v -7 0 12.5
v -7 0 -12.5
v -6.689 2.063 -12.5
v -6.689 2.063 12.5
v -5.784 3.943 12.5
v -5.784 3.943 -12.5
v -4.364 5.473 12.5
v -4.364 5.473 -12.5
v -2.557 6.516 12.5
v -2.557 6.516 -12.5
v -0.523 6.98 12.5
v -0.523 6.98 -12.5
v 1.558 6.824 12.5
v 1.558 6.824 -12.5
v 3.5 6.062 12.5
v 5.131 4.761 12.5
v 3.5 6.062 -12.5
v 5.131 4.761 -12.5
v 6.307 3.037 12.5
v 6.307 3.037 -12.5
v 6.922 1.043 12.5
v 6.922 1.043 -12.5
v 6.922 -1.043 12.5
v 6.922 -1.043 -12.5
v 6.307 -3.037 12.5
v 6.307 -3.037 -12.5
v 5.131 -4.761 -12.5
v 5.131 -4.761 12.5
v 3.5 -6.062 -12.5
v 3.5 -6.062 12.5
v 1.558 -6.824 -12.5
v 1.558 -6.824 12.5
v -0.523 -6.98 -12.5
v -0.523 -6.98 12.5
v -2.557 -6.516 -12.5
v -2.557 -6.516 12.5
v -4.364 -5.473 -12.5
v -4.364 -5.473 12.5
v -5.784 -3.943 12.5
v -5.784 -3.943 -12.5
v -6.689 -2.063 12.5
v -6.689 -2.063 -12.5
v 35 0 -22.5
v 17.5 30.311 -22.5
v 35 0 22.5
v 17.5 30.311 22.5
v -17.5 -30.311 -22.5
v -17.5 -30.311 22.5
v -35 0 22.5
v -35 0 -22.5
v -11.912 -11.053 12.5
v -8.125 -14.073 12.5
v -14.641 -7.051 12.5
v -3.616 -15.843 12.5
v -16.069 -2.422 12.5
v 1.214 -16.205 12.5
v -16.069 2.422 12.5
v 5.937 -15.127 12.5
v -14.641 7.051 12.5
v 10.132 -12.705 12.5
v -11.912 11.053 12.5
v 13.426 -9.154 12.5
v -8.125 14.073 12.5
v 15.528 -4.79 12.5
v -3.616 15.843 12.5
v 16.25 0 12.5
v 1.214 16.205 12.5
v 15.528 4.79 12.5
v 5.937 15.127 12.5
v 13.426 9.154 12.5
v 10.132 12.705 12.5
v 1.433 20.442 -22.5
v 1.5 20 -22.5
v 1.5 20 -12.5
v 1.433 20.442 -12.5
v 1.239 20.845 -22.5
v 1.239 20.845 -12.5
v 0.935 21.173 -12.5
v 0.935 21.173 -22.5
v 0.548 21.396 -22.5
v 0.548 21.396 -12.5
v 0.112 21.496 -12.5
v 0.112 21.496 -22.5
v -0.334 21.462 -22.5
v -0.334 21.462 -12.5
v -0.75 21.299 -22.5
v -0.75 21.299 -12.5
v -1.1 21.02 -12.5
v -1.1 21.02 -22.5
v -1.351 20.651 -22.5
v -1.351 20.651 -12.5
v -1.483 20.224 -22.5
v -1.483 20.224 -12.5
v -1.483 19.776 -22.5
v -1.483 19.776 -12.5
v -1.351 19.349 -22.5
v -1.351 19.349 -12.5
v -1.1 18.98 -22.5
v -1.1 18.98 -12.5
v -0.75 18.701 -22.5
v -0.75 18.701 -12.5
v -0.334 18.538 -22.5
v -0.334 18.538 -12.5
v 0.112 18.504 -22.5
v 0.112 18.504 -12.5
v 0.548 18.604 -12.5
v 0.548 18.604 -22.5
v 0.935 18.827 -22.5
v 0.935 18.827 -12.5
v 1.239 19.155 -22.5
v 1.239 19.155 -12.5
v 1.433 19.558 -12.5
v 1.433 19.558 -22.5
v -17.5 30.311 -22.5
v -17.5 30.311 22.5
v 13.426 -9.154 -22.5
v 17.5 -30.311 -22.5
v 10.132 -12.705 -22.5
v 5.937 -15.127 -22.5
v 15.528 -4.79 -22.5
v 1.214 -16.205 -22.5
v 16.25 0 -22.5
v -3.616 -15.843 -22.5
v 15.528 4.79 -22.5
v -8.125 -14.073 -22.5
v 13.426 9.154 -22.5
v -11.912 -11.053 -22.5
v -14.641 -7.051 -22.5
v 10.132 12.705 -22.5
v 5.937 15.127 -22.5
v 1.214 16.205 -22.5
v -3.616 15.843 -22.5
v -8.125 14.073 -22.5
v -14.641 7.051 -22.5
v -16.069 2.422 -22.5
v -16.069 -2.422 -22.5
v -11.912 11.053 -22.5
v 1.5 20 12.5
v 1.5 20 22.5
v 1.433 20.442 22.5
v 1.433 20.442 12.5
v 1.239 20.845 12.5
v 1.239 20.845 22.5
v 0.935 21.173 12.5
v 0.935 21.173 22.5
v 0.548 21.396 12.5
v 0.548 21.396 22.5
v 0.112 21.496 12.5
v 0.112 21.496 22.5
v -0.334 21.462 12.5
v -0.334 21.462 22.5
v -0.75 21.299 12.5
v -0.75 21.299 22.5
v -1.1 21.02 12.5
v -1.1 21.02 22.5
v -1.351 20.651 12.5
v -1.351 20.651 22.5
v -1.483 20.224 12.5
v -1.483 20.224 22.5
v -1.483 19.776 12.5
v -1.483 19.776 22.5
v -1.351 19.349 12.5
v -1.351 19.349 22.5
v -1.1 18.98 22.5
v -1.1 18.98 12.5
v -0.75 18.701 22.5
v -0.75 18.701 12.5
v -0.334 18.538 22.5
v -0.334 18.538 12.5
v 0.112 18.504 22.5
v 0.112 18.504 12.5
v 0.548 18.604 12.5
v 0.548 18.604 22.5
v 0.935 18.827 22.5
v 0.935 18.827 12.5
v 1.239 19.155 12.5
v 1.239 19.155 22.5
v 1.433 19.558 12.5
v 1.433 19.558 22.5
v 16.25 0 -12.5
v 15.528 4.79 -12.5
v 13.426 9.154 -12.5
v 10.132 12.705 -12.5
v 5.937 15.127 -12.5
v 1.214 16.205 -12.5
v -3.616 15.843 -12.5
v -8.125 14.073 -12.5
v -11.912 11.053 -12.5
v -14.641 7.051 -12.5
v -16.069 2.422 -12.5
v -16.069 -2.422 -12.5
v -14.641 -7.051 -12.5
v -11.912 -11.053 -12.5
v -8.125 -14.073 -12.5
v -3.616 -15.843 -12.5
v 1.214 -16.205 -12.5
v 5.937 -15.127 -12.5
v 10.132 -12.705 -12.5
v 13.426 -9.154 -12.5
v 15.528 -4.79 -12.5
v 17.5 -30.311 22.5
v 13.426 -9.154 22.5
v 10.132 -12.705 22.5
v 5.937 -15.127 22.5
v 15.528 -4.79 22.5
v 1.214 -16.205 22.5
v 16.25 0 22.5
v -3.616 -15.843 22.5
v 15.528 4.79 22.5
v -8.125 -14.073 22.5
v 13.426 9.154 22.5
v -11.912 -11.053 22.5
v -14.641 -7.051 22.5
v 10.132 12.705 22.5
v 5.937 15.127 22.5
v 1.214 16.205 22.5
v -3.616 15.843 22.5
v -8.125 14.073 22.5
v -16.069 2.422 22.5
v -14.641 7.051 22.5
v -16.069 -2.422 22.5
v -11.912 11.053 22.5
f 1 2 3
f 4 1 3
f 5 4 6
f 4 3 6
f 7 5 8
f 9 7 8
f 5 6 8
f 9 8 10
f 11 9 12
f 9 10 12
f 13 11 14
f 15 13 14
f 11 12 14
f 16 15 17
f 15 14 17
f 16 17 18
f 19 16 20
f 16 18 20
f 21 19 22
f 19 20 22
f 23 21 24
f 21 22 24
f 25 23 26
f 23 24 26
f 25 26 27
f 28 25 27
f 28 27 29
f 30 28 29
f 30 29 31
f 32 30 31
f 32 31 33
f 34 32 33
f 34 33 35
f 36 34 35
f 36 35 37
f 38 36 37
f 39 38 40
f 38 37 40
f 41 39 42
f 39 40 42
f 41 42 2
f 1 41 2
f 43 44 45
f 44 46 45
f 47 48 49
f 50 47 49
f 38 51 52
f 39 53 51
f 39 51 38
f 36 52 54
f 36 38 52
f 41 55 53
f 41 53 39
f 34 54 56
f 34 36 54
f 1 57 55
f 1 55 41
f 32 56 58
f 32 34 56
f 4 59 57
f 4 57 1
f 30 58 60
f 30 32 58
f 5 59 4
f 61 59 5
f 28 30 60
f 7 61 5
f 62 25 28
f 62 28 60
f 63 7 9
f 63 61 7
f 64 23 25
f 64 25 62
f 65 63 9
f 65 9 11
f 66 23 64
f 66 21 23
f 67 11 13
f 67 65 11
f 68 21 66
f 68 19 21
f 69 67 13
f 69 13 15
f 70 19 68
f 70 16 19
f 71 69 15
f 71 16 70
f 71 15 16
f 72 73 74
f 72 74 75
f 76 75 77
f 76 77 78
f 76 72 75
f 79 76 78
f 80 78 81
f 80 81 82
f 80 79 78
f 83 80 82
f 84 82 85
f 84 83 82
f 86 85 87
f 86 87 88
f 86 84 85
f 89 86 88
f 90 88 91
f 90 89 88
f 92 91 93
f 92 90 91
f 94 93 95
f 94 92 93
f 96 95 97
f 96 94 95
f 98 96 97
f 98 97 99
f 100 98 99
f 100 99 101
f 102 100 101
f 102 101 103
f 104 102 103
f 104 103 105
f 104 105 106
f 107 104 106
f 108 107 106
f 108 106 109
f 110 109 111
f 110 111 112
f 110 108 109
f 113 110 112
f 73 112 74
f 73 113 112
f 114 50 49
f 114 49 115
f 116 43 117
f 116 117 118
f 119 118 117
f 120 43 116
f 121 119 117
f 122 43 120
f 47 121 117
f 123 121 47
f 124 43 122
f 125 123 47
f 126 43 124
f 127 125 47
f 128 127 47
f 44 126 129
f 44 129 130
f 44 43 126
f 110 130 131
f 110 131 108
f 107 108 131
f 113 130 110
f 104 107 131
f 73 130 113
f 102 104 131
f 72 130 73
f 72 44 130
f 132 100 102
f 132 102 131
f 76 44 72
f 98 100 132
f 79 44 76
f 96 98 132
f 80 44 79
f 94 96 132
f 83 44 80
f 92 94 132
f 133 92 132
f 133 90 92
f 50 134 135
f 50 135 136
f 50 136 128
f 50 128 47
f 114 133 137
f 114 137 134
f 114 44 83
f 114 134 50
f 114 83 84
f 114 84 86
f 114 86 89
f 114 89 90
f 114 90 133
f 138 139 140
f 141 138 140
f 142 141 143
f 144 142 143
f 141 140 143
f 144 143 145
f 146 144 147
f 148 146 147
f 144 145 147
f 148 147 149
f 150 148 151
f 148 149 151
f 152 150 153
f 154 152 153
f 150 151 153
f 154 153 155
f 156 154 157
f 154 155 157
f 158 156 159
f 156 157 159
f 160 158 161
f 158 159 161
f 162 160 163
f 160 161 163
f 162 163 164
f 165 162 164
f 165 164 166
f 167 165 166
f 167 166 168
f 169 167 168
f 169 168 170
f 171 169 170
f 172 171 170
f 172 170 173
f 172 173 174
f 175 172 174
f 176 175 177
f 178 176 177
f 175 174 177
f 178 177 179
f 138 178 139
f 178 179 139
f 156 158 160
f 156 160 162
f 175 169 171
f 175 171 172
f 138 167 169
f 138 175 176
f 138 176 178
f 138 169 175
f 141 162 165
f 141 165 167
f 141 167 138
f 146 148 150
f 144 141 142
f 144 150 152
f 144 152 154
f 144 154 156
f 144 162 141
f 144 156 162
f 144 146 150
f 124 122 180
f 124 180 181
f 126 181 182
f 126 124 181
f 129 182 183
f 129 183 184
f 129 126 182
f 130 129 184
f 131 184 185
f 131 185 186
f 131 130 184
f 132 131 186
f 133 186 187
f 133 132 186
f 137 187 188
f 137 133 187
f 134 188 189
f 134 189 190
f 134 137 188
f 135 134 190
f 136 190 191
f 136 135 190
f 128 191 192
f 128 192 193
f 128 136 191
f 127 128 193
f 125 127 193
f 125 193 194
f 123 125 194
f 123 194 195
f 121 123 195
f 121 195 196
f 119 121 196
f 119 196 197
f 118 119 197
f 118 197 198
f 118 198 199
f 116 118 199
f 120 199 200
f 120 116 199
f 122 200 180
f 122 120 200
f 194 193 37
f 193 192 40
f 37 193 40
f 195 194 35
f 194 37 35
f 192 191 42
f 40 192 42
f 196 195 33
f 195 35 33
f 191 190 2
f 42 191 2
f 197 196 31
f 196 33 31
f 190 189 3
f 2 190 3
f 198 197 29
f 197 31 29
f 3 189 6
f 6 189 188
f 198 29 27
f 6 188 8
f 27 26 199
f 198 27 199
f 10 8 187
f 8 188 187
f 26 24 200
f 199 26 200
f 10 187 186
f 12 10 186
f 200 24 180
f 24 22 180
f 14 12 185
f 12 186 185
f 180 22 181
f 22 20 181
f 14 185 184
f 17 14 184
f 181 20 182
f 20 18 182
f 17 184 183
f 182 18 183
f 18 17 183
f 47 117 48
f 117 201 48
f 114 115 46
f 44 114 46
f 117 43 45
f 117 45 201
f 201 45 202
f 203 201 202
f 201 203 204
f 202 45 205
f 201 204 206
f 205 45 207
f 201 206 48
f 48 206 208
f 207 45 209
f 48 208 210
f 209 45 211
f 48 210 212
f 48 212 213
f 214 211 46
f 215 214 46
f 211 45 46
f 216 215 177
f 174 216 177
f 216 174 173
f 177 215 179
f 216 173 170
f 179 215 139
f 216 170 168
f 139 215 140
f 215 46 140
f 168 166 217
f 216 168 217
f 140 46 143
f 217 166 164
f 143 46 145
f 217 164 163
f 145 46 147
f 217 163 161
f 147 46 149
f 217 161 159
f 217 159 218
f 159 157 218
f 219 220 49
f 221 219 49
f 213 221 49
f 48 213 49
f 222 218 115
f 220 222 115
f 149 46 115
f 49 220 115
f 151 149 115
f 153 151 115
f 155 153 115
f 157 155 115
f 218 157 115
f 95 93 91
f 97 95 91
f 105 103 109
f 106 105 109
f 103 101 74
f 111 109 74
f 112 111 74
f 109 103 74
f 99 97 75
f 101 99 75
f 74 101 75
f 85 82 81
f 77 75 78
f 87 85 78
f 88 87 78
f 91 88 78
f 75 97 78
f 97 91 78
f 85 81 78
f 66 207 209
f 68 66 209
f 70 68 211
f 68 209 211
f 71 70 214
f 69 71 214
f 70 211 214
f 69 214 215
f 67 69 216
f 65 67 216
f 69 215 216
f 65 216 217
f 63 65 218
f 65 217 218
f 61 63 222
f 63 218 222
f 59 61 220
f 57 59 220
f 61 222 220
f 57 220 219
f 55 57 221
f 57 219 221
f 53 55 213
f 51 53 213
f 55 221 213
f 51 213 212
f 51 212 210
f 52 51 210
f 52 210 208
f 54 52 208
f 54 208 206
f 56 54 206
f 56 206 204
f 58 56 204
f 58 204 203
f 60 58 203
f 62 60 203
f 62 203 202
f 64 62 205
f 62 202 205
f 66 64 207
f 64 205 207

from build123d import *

# Parameters (mm, degrees)
BOSS_EXTRUDE1_DEPTH = 22.5
SKETCH2_R           = 16.25
CUT_EXTRUDE1_DEPTH  = 10
SKETCH3_R           = 7
CUT_EXTRUDE2_DEPTH  = 25
SKETCH4_R           = 1.5
CUT_EXTRUDE4_DEPTH  = 10


with BuildPart() as part:
    # Sketch1 → Boss-Extrude1 (new, symmetric)
    with BuildSketch(Plane.XY):
        Polygon((-17.5, 30.310889132), (17.5, 30.310889132), (35, 0), (17.5, -30.310889132), (-17.5, -30.310889132), (-35, 0), align=None)
    extrude(amount=BOSS_EXTRUDE1_DEPTH, both=True)

    # Sketch2 → Cut-Extrude1 (cut)
    with BuildSketch(Plane.XY.offset(22.5)):
        Circle(SKETCH2_R)
    cut_extrude1 = extrude(amount=-CUT_EXTRUDE1_DEPTH, mode=Mode.SUBTRACT)

    # Mirror1: Cut-Extrude1 across plane
    add(cut_extrude1.mirror(Plane.XY), mode=Mode.SUBTRACT)

    # Sketch3 → Cut-Extrude2 (cut)
    with BuildSketch(Plane(origin=(0, 0, -12.5), x_dir=(-1, 0, 0), z_dir=(0, 0, -1))):
        Circle(SKETCH3_R)
    extrude(amount=-CUT_EXTRUDE2_DEPTH, mode=Mode.SUBTRACT)

    # Sketch4 → Cut-Extrude4 (cut)
    with BuildSketch(Plane.XY.offset(22.5)):
        with Locations((0, 20)):
            Circle(SKETCH4_R)
    cut_extrude4 = extrude(amount=-CUT_EXTRUDE4_DEPTH, mode=Mode.SUBTRACT)

    # Mirror2: Cut-Extrude4 across plane
    add(cut_extrude4.mirror(Plane.XY), mode=Mode.SUBTRACT)


solid = part.part
